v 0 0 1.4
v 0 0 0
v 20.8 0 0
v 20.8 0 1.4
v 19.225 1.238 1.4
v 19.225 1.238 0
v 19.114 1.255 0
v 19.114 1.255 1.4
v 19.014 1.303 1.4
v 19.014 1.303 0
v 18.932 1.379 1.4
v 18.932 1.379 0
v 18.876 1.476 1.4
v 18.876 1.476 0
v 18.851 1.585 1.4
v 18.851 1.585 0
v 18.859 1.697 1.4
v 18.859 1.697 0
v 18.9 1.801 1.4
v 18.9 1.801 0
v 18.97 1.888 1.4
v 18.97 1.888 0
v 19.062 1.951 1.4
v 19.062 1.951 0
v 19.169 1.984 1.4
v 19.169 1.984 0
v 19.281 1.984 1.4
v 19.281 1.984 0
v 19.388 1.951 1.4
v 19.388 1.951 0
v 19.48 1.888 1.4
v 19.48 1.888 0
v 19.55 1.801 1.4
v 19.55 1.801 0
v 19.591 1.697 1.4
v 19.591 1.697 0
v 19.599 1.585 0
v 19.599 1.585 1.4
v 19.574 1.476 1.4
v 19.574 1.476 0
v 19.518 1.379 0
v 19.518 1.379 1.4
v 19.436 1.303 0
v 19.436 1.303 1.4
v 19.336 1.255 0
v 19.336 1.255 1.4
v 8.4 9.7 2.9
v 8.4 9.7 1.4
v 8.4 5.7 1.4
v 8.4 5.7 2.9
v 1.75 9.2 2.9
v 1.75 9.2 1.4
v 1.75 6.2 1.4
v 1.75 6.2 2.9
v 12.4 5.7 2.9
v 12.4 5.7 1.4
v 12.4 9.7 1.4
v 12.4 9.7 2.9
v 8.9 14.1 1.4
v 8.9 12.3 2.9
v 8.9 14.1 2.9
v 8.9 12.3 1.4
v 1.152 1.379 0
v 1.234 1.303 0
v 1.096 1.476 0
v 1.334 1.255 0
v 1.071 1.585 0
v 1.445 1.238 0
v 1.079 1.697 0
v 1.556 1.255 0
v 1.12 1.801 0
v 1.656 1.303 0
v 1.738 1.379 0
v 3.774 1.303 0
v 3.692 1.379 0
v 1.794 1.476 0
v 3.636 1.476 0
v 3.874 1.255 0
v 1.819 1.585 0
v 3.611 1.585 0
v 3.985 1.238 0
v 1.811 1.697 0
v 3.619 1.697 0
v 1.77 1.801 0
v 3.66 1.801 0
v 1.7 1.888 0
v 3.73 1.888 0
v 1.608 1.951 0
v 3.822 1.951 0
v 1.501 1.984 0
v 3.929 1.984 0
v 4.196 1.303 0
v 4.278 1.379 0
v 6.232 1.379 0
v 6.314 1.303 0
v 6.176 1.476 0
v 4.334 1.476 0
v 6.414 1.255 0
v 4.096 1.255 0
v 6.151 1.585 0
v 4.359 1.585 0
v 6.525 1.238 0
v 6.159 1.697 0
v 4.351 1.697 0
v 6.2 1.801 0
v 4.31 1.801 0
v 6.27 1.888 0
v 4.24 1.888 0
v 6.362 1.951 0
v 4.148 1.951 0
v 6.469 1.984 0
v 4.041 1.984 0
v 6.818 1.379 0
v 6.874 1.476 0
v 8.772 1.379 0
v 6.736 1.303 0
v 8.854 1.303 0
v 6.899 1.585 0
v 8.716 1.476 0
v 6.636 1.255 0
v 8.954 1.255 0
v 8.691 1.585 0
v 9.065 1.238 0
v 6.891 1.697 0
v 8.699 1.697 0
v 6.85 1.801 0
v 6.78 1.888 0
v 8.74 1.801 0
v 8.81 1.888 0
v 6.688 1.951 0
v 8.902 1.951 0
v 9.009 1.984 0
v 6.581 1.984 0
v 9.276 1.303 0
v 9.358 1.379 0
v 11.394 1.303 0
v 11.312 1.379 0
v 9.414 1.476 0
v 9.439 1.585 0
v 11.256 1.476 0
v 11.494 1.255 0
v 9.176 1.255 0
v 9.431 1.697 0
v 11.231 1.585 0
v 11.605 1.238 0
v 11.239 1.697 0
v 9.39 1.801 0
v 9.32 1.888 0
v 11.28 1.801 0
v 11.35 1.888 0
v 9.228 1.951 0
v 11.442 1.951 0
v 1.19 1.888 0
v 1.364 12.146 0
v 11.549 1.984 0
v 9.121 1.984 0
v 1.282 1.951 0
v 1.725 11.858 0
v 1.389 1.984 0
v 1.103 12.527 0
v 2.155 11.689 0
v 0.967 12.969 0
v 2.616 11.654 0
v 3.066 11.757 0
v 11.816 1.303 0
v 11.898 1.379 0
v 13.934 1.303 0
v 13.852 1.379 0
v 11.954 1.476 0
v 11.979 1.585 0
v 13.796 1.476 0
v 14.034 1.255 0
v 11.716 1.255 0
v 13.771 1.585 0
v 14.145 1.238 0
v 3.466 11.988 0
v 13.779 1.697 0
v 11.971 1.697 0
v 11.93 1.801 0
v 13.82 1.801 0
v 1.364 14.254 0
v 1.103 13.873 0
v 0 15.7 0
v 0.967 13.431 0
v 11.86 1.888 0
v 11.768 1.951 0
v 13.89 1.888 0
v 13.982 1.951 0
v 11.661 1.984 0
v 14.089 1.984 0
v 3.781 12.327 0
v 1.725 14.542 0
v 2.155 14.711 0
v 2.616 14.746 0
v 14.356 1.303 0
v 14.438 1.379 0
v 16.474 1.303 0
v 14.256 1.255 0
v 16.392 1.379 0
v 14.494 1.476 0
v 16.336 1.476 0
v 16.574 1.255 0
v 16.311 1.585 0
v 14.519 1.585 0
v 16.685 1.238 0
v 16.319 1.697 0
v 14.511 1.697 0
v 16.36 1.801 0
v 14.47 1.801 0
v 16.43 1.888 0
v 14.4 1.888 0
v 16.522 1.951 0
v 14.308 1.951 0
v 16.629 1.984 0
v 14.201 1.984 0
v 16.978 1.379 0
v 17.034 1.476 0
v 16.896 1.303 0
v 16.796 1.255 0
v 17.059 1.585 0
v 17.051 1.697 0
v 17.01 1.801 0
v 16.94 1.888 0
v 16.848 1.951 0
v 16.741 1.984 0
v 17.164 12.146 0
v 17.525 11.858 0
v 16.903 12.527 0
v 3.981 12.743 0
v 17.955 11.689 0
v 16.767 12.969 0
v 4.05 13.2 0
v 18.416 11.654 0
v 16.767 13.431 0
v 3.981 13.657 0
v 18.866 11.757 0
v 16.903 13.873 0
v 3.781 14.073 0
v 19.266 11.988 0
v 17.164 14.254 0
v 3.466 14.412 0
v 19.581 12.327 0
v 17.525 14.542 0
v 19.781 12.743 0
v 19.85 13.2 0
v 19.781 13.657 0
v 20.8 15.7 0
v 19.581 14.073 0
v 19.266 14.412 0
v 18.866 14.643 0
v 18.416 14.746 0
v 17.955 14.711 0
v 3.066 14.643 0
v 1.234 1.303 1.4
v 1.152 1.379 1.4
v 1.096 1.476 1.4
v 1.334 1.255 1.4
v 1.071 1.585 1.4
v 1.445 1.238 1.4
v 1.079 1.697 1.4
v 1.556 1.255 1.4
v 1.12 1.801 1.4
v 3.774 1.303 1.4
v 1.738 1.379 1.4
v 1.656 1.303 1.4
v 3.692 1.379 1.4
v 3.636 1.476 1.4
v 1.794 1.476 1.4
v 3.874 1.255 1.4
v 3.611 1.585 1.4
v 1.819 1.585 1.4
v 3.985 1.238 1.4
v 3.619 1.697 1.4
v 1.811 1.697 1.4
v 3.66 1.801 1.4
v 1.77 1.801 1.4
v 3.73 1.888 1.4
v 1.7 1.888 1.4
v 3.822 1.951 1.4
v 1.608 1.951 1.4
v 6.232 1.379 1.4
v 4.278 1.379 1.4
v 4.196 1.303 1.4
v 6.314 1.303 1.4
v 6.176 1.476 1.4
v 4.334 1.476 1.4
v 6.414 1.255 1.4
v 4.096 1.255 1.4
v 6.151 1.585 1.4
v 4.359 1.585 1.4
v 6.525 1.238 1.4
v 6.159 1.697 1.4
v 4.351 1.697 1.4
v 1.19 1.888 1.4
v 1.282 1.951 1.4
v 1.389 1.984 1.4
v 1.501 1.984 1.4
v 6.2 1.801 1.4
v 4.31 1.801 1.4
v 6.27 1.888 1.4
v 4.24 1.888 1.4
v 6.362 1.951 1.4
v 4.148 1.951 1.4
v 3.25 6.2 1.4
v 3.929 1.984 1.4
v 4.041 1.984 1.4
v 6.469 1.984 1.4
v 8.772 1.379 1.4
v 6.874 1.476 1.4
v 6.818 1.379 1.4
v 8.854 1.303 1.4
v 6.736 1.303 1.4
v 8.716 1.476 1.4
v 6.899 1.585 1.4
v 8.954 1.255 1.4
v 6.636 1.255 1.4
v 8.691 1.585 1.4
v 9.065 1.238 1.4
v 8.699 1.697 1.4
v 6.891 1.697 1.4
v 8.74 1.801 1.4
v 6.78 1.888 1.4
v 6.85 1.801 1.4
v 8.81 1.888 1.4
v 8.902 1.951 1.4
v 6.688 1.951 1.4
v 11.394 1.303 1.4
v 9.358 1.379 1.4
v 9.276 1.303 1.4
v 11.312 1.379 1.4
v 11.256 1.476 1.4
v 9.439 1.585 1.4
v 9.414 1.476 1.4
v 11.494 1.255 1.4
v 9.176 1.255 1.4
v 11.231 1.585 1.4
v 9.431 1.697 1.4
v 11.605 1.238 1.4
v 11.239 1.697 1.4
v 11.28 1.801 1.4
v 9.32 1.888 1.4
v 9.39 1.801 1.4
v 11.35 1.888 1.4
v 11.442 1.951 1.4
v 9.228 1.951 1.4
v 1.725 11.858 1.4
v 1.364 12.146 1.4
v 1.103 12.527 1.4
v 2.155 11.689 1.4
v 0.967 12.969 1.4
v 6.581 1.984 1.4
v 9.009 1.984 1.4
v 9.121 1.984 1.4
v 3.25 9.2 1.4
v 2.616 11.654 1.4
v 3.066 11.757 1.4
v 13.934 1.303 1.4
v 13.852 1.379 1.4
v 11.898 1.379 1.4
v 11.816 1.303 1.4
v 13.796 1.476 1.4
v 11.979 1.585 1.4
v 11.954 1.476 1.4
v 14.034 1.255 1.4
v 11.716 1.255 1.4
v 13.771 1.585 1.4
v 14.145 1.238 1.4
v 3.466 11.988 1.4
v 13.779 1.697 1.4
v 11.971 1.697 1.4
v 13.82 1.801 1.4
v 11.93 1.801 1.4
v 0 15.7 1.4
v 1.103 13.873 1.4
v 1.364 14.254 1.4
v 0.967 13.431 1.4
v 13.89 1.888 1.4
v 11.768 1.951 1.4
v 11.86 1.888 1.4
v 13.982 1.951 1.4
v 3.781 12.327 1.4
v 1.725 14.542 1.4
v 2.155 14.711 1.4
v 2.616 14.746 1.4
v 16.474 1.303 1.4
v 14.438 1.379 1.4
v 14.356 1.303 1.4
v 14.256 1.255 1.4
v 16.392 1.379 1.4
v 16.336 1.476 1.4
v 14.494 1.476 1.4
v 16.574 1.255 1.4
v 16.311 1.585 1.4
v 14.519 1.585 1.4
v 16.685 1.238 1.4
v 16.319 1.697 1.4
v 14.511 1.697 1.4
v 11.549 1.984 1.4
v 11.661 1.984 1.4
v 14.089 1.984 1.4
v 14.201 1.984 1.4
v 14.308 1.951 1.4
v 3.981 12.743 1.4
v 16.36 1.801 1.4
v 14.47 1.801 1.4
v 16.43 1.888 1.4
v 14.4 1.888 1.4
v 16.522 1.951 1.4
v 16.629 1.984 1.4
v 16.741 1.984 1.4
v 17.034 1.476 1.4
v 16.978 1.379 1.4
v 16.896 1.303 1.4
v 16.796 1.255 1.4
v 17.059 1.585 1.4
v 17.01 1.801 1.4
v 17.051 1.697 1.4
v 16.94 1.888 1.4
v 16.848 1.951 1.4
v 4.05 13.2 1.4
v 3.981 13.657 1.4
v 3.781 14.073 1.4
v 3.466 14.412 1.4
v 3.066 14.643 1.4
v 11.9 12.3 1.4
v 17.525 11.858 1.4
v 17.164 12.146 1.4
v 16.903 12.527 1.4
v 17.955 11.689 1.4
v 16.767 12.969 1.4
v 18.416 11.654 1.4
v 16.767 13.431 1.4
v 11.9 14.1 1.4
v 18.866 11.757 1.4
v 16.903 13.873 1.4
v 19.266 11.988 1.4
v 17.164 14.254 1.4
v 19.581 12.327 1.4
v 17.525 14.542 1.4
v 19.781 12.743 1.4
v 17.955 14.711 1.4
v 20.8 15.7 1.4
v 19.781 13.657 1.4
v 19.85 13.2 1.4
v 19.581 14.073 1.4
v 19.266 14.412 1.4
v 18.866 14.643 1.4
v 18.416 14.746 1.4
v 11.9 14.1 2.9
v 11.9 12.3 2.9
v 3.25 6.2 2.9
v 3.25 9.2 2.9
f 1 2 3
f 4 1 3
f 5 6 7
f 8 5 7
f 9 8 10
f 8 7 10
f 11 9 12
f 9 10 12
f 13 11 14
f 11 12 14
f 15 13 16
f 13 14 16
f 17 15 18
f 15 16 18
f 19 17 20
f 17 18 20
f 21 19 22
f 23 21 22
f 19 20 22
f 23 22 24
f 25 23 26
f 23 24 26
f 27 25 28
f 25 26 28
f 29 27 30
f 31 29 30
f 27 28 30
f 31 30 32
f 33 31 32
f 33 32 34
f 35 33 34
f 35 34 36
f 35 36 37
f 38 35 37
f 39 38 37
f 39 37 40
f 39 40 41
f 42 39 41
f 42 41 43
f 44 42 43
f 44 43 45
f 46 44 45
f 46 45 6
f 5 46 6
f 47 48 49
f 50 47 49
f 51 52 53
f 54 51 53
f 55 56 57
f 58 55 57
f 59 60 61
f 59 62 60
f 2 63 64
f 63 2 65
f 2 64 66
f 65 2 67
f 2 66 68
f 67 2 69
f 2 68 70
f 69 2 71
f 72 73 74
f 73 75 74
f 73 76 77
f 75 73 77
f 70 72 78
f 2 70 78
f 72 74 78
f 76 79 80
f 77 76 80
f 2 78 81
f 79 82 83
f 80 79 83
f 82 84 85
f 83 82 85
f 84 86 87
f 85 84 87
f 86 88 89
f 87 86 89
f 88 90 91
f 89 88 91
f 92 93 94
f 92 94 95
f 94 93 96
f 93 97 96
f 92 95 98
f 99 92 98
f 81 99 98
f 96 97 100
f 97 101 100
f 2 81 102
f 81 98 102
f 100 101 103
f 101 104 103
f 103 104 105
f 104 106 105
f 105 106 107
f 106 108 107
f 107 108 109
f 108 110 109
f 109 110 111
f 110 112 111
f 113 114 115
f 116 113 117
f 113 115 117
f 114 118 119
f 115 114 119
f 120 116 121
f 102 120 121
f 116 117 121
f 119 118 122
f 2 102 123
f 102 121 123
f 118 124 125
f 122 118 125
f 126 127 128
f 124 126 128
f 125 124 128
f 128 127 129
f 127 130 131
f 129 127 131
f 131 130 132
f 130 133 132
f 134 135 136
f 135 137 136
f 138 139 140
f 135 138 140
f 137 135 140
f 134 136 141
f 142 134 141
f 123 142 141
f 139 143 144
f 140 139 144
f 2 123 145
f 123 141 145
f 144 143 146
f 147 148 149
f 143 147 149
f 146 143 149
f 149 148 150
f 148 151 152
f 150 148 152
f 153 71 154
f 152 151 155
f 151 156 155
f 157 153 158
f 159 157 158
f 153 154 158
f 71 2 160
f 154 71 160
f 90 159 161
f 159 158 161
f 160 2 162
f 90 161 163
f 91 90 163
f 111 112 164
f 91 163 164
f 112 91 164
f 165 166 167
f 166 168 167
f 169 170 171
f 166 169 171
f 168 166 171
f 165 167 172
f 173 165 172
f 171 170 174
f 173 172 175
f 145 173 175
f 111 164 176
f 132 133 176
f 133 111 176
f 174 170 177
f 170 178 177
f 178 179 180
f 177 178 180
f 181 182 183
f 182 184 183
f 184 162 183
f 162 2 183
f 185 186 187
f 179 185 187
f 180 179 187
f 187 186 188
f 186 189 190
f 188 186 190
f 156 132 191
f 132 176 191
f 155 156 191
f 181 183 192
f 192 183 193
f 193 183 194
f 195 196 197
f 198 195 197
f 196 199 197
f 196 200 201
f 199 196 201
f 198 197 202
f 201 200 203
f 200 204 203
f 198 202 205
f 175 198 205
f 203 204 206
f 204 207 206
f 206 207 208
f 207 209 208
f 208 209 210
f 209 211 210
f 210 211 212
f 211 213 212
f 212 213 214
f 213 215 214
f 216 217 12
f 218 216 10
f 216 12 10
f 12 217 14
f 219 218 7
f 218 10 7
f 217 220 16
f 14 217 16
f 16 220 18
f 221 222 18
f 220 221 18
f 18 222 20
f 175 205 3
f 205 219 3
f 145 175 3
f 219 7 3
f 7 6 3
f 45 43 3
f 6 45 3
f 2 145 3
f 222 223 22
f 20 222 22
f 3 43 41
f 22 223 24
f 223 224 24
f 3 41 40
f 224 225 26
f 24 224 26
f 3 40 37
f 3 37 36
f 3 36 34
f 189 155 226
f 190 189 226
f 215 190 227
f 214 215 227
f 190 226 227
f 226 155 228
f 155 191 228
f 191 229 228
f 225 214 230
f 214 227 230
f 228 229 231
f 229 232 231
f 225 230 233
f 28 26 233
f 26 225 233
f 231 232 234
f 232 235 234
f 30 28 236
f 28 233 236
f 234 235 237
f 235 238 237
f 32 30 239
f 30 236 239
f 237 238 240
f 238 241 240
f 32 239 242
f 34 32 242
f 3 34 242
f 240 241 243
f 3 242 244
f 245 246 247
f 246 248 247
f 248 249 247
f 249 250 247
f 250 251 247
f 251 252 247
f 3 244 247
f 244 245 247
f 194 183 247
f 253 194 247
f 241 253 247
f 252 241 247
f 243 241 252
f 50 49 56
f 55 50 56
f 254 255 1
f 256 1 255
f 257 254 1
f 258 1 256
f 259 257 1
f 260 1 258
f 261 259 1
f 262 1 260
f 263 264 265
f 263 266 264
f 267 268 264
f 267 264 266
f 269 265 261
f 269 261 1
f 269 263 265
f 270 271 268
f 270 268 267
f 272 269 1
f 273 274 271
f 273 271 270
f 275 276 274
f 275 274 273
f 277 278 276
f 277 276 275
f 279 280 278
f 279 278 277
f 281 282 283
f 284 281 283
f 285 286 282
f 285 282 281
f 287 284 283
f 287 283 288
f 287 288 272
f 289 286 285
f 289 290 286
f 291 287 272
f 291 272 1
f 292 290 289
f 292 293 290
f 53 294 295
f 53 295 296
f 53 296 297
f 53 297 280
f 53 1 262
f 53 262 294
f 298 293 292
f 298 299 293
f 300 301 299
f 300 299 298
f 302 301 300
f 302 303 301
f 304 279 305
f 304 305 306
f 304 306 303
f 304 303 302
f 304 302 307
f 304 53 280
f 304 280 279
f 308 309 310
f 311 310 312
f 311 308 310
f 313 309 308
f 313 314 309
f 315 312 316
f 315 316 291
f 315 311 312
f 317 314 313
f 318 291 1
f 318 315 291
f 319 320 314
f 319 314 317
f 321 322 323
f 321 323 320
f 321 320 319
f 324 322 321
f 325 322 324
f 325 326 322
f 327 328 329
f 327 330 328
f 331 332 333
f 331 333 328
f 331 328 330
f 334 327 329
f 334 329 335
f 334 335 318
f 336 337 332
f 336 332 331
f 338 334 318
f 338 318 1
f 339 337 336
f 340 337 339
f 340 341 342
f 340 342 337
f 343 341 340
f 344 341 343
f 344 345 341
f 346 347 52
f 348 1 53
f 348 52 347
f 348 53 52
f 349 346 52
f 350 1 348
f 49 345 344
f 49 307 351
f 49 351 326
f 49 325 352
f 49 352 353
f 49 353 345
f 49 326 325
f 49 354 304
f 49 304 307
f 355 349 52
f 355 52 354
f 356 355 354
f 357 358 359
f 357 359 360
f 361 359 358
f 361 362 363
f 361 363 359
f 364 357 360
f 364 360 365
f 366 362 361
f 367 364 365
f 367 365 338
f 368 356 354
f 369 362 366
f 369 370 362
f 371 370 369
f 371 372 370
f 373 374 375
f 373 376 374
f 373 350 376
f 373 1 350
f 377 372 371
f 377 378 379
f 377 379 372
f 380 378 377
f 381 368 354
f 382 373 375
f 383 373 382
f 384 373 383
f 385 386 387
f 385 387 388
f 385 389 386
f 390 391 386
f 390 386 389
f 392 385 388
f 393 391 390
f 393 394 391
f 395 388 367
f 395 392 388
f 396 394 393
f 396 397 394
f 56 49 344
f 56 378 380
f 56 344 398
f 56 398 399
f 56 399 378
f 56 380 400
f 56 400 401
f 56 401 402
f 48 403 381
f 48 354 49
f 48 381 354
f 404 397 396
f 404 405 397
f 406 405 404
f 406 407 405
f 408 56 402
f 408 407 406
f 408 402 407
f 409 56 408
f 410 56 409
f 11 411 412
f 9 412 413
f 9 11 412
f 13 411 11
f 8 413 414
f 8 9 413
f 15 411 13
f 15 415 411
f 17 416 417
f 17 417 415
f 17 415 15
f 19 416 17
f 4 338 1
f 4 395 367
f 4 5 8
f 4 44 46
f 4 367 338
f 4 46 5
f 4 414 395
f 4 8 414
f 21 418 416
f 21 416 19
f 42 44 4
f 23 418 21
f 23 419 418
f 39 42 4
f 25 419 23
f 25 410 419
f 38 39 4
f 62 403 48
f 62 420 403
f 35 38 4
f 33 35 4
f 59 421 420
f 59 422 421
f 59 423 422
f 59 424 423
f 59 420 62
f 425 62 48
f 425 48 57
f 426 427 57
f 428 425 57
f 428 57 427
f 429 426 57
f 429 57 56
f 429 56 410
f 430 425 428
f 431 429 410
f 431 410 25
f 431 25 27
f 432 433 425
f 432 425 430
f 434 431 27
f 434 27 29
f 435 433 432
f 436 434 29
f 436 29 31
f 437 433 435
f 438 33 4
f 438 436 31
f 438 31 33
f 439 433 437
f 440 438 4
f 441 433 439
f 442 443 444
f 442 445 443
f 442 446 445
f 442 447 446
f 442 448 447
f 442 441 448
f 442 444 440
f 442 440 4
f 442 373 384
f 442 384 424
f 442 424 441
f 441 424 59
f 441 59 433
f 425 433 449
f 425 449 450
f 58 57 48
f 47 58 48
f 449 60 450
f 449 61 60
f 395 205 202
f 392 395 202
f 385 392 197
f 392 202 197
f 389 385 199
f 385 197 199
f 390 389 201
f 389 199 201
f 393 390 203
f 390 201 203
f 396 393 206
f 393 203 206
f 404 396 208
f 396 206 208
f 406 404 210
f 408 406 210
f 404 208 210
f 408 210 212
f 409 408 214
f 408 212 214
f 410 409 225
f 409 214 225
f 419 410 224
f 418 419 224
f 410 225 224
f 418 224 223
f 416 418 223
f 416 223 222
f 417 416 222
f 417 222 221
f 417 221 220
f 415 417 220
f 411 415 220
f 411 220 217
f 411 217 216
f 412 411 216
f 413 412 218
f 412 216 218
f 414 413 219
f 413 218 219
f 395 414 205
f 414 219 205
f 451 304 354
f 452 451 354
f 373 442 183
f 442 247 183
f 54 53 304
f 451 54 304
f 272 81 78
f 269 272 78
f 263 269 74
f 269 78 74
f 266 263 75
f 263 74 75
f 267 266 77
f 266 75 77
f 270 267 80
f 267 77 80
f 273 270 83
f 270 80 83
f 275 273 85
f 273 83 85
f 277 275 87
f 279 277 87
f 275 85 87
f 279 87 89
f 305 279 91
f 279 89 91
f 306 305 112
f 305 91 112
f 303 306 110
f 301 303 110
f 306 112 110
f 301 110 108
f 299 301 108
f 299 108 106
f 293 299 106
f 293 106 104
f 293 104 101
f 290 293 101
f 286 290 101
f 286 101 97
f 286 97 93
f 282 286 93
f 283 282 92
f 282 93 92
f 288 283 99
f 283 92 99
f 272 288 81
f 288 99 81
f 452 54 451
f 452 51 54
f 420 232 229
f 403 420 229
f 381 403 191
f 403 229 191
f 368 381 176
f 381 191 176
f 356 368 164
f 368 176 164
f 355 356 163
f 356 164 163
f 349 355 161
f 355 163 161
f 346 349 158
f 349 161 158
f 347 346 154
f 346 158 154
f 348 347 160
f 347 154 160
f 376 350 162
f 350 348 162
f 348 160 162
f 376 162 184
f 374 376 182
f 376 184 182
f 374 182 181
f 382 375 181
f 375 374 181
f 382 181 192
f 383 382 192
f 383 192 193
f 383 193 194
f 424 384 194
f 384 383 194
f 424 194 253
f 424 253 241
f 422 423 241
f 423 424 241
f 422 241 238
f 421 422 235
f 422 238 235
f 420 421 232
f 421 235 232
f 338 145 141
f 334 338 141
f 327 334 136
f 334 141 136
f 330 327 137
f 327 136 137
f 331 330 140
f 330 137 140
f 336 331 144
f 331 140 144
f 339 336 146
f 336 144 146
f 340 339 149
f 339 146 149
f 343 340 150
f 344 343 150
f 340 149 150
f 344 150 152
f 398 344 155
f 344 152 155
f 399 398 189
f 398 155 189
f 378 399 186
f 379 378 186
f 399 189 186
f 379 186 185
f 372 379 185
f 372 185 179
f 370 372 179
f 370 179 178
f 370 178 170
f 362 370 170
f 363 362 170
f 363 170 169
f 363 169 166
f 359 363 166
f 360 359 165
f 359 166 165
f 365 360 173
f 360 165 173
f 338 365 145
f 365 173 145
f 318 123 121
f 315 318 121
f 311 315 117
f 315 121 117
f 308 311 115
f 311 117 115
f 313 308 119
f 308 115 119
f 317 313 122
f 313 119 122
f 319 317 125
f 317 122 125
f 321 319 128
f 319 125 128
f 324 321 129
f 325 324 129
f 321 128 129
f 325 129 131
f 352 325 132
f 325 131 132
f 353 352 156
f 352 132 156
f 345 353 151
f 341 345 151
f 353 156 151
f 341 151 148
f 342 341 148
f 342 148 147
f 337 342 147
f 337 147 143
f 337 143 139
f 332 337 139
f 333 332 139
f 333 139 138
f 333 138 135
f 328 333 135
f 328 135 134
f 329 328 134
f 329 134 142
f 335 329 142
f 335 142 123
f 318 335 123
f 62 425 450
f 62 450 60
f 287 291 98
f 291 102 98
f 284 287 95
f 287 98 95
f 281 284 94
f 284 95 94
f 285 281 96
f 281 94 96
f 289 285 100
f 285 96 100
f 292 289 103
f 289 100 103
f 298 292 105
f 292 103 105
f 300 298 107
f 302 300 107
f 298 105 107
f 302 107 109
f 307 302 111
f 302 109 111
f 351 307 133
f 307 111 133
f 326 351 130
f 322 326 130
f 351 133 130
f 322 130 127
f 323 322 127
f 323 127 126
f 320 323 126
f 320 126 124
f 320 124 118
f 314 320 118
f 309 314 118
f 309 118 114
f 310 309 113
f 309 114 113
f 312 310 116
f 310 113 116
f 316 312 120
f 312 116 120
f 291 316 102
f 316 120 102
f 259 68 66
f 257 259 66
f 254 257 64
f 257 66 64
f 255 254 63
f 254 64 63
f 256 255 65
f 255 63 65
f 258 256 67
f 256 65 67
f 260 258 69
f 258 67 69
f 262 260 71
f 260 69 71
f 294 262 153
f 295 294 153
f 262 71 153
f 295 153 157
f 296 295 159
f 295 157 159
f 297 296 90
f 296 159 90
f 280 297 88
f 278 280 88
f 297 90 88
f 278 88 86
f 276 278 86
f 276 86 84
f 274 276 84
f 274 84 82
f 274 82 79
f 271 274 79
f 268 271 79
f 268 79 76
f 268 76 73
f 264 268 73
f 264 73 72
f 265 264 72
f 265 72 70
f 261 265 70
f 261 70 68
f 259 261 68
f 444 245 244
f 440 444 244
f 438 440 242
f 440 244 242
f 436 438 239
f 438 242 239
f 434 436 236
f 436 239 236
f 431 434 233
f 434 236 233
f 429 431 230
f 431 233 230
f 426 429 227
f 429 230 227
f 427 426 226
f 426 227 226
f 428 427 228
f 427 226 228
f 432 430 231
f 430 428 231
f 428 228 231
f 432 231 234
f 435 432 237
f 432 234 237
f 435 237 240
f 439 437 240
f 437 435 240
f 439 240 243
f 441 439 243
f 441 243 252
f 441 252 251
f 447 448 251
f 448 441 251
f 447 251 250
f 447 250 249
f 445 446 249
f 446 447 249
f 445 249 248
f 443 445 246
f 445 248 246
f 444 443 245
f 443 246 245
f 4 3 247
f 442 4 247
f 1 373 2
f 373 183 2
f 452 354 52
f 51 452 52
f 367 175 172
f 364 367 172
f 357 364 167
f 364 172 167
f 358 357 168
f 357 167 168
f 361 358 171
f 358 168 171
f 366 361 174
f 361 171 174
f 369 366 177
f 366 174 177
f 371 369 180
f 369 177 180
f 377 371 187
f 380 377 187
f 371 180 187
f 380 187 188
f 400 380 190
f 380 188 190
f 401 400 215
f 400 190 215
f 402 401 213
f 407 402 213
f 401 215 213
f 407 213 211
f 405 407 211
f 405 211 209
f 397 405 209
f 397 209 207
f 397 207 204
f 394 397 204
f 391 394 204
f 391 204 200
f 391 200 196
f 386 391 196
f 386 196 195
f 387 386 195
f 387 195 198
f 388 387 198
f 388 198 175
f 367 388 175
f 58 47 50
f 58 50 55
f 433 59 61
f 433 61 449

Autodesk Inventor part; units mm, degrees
ref_plane "YZ Plane" through (0, 0, 0) normal (1, 0, 0) x (0, 1, 0)
ref_plane "XZ Plane" through (0, 0, 0) normal (0, 1, 0) x (-1, 0, 0)
ref_plane "XY Plane" through (0, 0, 0) normal (0, 0, 1) x (1, 0, 0)
sketch "Skizze1" plane through (0, 0, 0) normal (0, 0, 1) x (1, 0, 0)
  line L0 (0, 0) -> (20.8, 0)
  line L1 (20.8, 0) -> (20.8, 15.7)
  line L2 (20.8, 15.7) -> (0, 15.7)
  line L3 (0, 15.7) -> (0, 0)
  circle A0 centre (2.5, 13.2) radius 1.55
  circle A1 centre (18.3, 13.2) radius 1.55
  dimension "d0" = 20.8
  dimension "d1" = 15.7
  dimension "d2" = 2.5
  dimension "d3" = 2.5
  dimension "d4" = 2.5
  dimension "d5" = 2.5
  dimension "d6" = 3.1
  dimension "d7" = 3.1
extrude "Grundkörper" add sketch "Skizze1" along normal blind 1.4
sketch "Skizze2" plane through (0, 0, 1.4) normal (0, 0, 1) x (1, 0, 0)
  line L0 (8.4, 5.7) -> (12.4, 5.7)
  line L1 (12.4, 5.7) -> (12.4, 9.7)
  line L2 (12.4, 9.7) -> (8.4, 9.7)
  line L3 (8.4, 9.7) -> (8.4, 5.7)
  line L4 (20.8, 0) -> (20.8, 15.7) projected
  line L5 (20.8, 15.7) -> (0, 15.7) projected
  line L6 (1.75, 6.2) -> (3.25, 6.2)
  line L7 (3.25, 6.2) -> (3.25, 9.2)
  line L8 (3.25, 9.2) -> (1.75, 9.2)
  line L9 (1.75, 9.2) -> (1.75, 6.2)
  line L10 (12.4, 7.7) -> (8.4, 7.7) construction
  line L11 (3.25, 7.7) -> (1.75, 7.7) construction
  line L12 (0, 15.7) -> (0, 0) construction
  line L13 (8.9, 14.1) -> (11.9, 14.1)
  line L14 (11.9, 14.1) -> (11.9, 12.3)
  line L15 (11.9, 12.3) -> (8.9, 12.3)
  line L16 (8.9, 12.3) -> (8.9, 14.1)
  line L17 (10.4, 15.7) -> (10.4, 0) construction
  line L18 (0, 0) -> (20.8, 0) construction
  line L19 (10.4, 9.7) -> (10.4, 5.7) construction
  circle A0 centre (2.5, 13.2) radius 1.55 construction
  circle A1 centre (18.3, 13.2) radius 1.55 construction
  line L20 (2.5, 13.2) -> (18.3, 13.2) construction
  line L21 (10.4, 14.1) -> (10.4, 12.3) construction
  line L22 (8.9, 13.2) -> (11.9, 13.2) construction
  line L23 (2.5, 13.2) -> (2.5, 11.65) construction
  line L24 (2.5, 9.2) -> (2.5, 6.2) construction
  dimension "d10" = 4
  dimension "d11" = 4
  dimension "d13" = 6
  dimension "d14" = 3
  dimension "d15" = 1.5
  dimension "d17" = 1.8
  dimension "d18" = 3
extrude "SMDs" add sketch "Skizze2" along normal blind 1.5
sketch "Skizze3" plane through (0, 0, 1.4) normal (0, 0, 1) x (1, 0, 0)
  line L0 (20.8, 15.7) -> (0, 15.7) construction
  line L1 (10.4, 15.7) -> (10.4, 0) construction
  line L2 (0, 0) -> (20.8, 0) construction
  line L3 (0, 15.7) -> (0, 0) construction
  line L4 (0, 1.6) -> (20.8, 1.6) construction
  line L5 (20.8, 0) -> (20.8, 15.7) construction
  point P0 (19.225, 1.6132)
  point P1 (16.685, 1.6132)
  point P2 (14.145, 1.6132)
  point P3 (11.605, 1.6132)
  point P4 (9.065, 1.6132)
  point P5 (6.525, 1.6132)
  point P6 (3.985, 1.6132)
  point P7 (1.445, 1.6132)
  dimension "d28" = 14.1
  dimension "d29" = 17.65
  dimension "d33" = 2.54
hole "Bohrung1" at (19.225, 1.6132, 1.4) at (16.685, 1.6132, 1.4) at (14.145, 1.6132, 1.4) at (11.605, 1.6132, 1.4) at (9.065, 1.6132, 1.4) at (6.525, 1.6132, 1.4) at (3.985, 1.6132, 1.4) at (1.445, 1.6132, 1.4) direction (0, 0, -1) diameter 0.75 end through all
ref_plane "Work Plane1" through (0, 0, 0.7) normal (0, 0, 1) x (1, 0, 0)
properties part number "GY_521"
